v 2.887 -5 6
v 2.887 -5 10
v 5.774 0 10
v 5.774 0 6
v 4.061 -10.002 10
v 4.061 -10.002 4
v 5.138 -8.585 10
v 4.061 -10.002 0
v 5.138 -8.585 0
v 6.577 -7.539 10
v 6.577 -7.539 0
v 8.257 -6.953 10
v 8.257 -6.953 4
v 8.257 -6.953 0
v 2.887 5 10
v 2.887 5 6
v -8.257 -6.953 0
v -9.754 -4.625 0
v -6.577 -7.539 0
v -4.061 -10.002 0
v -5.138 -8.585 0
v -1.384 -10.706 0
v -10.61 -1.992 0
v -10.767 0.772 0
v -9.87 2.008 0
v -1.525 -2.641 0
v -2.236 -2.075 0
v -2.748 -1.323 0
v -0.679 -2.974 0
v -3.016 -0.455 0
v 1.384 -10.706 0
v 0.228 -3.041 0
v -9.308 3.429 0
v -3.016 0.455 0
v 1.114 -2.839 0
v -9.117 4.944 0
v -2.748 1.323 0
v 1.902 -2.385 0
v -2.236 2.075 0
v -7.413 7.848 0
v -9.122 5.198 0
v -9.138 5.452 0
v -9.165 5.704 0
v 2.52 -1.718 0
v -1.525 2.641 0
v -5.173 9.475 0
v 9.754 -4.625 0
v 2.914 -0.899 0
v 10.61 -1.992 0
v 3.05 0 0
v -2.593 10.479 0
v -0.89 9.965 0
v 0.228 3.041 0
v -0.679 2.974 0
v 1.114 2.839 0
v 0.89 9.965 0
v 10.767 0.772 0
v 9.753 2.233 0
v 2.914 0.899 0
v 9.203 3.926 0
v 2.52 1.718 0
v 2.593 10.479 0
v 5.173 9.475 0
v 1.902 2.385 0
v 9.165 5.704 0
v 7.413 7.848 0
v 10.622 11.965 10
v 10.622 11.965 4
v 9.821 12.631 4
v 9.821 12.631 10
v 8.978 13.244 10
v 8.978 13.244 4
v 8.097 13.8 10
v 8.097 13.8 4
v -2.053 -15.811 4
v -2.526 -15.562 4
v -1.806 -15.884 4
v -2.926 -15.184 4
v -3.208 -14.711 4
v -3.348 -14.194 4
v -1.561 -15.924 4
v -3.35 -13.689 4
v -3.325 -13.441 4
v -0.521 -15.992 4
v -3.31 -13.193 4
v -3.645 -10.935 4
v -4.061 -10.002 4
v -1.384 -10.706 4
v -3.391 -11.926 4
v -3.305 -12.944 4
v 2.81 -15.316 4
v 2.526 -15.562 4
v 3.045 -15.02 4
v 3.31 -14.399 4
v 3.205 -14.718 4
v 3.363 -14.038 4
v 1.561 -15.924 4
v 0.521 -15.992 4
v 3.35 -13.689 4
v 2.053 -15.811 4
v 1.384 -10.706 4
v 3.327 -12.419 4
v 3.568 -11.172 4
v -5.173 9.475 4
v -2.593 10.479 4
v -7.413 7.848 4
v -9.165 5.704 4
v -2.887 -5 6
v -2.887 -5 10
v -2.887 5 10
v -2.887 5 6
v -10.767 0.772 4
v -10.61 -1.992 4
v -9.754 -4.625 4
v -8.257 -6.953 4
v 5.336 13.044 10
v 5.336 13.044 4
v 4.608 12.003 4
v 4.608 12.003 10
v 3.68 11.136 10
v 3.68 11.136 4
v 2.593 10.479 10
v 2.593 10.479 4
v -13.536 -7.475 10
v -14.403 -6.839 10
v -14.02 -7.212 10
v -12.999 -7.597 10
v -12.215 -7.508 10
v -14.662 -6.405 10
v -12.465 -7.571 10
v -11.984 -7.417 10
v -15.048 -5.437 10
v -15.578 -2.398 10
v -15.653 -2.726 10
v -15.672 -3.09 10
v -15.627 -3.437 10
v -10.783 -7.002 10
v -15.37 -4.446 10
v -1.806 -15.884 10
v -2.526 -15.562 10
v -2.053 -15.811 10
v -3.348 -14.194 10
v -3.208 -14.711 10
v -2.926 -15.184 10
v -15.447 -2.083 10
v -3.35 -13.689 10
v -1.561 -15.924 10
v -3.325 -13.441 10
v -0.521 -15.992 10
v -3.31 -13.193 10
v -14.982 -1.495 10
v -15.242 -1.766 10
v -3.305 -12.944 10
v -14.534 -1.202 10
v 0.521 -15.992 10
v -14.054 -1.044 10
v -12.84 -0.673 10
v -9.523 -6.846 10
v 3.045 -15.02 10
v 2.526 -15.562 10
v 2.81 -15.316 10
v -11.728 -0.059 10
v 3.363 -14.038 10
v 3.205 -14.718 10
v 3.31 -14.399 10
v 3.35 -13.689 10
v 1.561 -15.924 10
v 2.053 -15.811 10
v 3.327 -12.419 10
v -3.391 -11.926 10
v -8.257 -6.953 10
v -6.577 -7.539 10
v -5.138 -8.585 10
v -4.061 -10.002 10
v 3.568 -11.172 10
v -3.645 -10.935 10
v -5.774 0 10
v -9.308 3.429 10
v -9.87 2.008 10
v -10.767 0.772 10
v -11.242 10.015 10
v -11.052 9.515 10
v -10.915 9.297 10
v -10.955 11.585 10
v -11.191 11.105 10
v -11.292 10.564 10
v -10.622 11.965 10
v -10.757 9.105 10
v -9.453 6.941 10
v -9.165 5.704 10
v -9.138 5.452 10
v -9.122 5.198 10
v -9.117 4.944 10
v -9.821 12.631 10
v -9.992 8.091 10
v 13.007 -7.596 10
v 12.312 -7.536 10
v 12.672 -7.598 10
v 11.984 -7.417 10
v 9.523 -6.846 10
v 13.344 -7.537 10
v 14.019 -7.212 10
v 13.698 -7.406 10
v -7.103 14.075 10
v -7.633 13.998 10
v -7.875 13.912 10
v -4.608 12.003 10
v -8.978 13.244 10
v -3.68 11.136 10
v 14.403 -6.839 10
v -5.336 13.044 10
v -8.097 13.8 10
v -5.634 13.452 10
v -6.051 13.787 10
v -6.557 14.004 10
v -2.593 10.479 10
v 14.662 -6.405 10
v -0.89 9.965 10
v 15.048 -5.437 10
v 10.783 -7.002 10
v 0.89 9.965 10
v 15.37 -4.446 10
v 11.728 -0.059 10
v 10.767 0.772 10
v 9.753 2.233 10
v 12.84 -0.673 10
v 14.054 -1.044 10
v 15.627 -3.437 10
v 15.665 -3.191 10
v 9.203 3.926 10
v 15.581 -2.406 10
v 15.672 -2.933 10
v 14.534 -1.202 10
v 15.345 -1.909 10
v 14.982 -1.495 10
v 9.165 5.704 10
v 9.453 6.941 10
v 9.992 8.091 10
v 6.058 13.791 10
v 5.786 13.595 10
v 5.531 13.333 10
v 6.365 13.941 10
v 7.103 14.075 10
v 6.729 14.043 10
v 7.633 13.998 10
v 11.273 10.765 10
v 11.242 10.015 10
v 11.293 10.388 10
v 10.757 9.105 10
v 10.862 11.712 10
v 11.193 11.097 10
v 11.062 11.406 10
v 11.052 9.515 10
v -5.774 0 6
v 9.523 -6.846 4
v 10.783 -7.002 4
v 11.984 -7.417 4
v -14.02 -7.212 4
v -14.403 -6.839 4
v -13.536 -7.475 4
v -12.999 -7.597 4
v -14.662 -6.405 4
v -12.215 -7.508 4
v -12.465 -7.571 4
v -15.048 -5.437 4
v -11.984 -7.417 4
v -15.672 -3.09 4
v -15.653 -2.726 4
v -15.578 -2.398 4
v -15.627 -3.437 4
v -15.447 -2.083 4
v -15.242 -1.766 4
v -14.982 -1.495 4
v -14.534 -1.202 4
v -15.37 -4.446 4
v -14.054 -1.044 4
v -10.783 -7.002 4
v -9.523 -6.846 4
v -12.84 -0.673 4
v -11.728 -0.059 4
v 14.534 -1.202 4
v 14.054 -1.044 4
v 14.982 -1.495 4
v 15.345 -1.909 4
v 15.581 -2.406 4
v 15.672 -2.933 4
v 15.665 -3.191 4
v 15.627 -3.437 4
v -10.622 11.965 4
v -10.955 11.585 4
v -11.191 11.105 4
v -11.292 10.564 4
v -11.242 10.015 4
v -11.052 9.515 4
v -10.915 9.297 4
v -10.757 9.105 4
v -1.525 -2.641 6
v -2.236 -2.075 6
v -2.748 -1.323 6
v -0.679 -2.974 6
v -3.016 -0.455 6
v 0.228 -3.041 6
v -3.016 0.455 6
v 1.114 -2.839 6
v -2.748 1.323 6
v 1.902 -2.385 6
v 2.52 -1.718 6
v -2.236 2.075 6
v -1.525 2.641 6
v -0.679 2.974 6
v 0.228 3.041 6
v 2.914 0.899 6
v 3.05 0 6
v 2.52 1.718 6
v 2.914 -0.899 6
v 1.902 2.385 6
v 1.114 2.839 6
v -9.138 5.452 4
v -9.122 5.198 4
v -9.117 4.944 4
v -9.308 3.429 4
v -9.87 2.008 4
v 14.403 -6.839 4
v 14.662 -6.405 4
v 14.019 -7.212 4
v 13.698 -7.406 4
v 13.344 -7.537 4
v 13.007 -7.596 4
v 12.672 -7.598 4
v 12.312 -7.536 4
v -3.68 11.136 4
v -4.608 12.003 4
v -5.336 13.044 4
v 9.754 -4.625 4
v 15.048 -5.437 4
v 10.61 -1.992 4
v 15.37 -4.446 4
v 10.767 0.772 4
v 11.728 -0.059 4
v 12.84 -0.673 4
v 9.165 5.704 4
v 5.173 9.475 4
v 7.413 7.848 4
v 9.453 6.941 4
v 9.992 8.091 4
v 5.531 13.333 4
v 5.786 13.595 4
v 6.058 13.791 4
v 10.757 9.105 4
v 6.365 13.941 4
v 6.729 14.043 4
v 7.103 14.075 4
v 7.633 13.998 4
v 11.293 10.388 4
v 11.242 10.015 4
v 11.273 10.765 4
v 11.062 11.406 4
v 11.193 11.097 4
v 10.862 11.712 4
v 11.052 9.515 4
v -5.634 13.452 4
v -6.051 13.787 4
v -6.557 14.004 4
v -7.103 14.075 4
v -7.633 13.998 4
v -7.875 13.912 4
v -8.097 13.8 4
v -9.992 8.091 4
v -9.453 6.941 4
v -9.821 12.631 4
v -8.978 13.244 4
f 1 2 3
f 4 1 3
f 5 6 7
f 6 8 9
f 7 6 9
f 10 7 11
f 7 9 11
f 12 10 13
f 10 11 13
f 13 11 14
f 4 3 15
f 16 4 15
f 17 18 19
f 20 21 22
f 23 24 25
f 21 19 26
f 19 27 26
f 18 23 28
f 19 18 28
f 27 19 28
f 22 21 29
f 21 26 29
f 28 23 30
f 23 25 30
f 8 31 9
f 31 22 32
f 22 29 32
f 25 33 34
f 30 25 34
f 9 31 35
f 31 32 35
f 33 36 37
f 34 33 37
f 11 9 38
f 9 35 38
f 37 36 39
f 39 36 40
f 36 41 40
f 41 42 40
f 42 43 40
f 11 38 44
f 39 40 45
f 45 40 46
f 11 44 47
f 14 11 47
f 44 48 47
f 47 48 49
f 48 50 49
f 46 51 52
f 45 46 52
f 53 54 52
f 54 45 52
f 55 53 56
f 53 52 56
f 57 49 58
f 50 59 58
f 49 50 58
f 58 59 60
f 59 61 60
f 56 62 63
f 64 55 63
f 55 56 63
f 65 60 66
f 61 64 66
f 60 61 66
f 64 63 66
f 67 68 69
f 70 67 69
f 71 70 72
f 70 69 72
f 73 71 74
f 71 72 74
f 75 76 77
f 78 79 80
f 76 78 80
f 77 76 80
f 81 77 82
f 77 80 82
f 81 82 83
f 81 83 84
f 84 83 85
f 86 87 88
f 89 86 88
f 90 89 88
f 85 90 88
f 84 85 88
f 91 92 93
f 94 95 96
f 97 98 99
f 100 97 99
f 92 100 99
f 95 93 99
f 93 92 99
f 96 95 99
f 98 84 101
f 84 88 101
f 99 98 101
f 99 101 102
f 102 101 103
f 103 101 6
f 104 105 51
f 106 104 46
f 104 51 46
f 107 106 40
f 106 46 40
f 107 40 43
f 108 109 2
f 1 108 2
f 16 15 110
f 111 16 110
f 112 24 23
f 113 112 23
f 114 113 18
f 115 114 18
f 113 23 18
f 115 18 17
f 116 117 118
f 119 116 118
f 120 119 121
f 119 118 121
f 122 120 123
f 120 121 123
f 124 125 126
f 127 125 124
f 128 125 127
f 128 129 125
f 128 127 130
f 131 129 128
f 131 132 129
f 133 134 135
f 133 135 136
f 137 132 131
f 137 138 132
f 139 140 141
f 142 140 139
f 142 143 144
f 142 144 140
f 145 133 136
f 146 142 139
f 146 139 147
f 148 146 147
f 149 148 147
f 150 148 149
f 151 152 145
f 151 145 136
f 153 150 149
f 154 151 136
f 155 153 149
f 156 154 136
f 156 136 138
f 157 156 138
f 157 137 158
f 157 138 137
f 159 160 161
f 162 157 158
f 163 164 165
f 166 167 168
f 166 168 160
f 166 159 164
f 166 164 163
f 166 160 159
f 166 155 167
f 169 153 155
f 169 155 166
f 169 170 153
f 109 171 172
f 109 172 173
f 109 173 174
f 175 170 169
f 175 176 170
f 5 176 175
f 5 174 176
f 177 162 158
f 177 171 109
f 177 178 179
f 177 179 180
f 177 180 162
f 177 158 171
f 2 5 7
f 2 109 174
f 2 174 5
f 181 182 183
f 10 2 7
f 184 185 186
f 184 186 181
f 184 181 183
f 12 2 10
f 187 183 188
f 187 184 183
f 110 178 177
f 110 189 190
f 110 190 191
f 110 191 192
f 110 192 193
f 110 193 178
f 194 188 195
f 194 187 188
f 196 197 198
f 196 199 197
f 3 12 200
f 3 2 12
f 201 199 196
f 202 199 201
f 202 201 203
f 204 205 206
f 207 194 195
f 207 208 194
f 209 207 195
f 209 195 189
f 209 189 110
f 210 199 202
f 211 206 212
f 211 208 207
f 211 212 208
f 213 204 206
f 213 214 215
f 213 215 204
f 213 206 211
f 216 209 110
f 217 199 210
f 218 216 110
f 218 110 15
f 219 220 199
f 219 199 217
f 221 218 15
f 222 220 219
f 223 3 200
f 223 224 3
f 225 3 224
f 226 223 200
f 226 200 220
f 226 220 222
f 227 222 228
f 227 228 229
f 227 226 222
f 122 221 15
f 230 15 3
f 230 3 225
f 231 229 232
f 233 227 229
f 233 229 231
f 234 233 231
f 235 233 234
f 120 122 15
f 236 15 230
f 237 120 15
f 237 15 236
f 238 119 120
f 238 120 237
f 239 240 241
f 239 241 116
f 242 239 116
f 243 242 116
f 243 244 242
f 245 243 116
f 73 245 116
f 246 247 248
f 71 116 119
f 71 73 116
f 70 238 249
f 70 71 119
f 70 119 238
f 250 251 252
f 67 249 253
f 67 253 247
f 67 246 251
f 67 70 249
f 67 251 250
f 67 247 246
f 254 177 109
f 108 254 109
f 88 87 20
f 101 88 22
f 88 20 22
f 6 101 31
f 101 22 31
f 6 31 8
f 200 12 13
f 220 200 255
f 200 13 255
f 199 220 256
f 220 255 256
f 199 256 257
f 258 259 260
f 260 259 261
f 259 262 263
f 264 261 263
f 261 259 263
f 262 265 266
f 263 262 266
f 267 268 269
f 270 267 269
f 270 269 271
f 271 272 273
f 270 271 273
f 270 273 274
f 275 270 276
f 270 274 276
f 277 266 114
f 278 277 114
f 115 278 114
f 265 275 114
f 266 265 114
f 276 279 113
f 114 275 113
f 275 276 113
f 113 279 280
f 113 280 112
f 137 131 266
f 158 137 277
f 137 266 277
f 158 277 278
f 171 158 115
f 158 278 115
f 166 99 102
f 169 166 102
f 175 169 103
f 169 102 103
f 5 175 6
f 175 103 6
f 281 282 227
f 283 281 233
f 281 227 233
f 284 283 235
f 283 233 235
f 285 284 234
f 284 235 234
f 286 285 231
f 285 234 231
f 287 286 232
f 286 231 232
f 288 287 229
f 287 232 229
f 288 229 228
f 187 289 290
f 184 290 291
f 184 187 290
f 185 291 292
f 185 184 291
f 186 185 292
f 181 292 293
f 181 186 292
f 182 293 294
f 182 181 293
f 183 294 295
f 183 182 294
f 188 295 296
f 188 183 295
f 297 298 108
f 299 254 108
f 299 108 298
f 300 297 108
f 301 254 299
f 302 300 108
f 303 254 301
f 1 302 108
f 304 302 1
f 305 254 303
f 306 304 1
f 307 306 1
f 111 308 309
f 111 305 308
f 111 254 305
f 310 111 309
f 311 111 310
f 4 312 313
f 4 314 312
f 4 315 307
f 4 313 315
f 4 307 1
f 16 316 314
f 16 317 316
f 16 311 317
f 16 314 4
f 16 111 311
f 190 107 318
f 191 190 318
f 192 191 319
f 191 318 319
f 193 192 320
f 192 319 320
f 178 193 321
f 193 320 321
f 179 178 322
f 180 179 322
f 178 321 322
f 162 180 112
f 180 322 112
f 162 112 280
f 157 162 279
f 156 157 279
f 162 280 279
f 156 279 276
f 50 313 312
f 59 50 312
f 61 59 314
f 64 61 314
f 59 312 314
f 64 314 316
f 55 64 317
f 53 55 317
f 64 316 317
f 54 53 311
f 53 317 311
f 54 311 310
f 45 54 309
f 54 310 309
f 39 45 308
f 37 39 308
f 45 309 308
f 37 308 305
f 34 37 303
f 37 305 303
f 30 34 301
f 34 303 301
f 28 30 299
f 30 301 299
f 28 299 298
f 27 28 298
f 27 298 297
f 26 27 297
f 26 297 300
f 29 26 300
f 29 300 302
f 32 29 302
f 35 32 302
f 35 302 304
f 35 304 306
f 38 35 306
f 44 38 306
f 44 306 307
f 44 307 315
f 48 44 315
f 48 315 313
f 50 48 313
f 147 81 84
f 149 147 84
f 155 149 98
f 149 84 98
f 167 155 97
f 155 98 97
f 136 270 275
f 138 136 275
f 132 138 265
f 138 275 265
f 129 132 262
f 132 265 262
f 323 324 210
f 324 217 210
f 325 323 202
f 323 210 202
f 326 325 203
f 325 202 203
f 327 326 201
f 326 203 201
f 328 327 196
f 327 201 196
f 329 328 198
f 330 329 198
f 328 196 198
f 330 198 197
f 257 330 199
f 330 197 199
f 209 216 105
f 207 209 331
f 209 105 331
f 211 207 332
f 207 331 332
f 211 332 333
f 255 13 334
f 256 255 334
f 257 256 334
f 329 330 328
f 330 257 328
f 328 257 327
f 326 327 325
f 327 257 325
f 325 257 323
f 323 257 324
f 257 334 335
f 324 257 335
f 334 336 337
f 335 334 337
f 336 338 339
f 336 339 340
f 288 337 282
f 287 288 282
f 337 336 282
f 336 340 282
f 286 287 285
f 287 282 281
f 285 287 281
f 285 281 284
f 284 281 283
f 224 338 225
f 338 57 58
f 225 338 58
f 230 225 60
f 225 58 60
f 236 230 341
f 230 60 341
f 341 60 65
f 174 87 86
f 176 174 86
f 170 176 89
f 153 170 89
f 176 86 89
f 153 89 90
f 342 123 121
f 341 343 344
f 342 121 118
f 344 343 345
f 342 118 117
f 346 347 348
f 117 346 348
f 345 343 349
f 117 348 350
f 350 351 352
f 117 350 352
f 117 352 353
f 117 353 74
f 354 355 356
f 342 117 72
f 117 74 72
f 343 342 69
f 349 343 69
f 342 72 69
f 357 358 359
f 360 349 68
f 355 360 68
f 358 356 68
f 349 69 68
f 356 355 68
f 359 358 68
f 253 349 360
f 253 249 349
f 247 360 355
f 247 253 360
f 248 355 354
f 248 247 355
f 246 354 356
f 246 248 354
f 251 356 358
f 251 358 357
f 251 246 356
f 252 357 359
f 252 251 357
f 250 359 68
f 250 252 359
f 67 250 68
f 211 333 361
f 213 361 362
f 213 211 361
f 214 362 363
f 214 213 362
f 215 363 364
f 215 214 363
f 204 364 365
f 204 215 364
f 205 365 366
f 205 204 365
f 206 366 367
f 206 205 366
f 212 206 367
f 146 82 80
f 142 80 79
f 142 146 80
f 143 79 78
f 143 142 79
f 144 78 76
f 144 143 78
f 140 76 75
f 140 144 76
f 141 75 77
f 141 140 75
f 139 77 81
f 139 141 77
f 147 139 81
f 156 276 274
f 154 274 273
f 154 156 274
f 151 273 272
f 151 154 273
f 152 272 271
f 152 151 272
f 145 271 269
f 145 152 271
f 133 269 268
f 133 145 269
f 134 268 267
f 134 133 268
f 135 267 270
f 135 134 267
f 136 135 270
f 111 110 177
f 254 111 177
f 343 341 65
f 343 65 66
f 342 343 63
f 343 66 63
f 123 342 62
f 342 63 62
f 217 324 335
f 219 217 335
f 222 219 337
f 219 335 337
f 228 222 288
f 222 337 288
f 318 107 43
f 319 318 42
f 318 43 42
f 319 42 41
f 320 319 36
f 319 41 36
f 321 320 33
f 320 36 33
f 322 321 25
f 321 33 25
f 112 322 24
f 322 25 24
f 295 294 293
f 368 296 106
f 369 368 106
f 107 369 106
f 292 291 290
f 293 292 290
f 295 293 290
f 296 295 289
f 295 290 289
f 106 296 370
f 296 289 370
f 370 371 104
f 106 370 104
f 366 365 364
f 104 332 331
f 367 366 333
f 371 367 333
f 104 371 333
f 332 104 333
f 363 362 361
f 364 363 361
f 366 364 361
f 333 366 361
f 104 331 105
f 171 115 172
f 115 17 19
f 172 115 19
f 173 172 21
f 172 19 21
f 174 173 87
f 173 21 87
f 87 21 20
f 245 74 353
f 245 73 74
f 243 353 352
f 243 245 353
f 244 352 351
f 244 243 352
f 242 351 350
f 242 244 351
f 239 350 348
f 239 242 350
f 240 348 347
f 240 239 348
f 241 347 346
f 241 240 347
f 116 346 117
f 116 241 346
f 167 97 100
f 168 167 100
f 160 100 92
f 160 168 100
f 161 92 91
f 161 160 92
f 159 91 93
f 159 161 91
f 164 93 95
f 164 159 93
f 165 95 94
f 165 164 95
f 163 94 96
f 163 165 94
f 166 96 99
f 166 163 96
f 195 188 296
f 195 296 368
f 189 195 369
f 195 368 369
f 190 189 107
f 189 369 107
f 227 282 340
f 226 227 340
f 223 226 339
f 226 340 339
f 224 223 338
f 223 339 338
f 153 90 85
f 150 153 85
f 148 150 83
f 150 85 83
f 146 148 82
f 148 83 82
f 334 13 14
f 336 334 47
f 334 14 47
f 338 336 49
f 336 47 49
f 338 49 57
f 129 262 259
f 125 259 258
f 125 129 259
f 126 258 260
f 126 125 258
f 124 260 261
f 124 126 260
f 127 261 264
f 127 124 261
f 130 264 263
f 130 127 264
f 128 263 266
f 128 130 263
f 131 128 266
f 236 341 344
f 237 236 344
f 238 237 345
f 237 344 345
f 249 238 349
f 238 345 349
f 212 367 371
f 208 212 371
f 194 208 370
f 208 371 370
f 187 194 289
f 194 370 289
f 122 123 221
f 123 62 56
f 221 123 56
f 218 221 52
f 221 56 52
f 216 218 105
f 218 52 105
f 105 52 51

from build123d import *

# Parameters (mm, degrees)
F0_R     = 10.795
F1_DEPTH = 4
F3_DEPTH = 6
F4_R     = 2
F5_R     = 3.05
F6_DEPTH = 25
F8_DEPTH = 4
F9_DEPTH = 25


with BuildPart() as f1:
    # F0 (on Top) → F1 (new body)
    with BuildSketch(Plane.XY):
        Circle(F0_R)
    extrude(amount=F1_DEPTH)

    # F2 (on face) → F3 (join)
    with BuildSketch(Plane.XY.offset(4)):
        with BuildLine():
            ThreePointArc((10.7673628762, 0.7719596449), (9.4157239289, 3.0593541588), (9.164726046, 5.704368633))
            ThreePointArc((9.164726046, 5.704368633), (6.3451417985, 8.7333384543), (2.5931208628, 10.4789192759))
            ThreePointArc((2.5931208628, 10.4789192759), (0, 9.9002780251), (-2.5931208628, 10.4789192759))
            ThreePointArc((-2.5931208628, 10.4789192759), (-6.3451417985, 8.7333384543), (-9.164726046, 5.704368633))
            ThreePointArc((-9.164726046, 5.704368633), (-9.129079829, 5.3250630068), (-9.1171822858, 4.94427191))
            ThreePointArc((-9.1171822858, 4.94427191), (-9.5447100851, 2.7008768479), (-10.7673628762, 0.7719596449))
            ThreePointArc((-10.7673628762, 0.7719596449), (-10.2666550934, -3.3358384543), (-8.2572330568, -6.9534255763))
            ThreePointArc((-8.2572330568, -6.9534255763), (-5.8192374168, -8.0094931714), (-4.0614753639, -10.0018219774))
            ThreePointArc((-4.0614753639, -10.0018219774), (0, -10.795), (4.0614753639, -10.0018219774))
            ThreePointArc((4.0614753639, -10.0018219774), (5.8192374168, -8.0094931714), (8.2572330568, -6.9534255763))
            ThreePointArc((8.2572330568, -6.9534255763), (10.1407311336, -3.7010264895), (10.795, 0))
            ThreePointArc((10.795, 0), (10.7880885065, 0.3862271041), (10.7673628762, 0.7719596449))
        make_face()
        with BuildLine():
            ThreePointArc((9.164726046, 5.704368633), (10.1650587649, 8.3626728896), (12.2607475986, 10.2797893132))
            ThreePointArc((12.2607475986, 10.2797893132), (9.4045640367, 12.94427191), (5.9878812408, 14.8372934947))
            ThreePointArc((5.9878812408, 14.8372934947), (4.8121986381, 12.2517534182), (2.5931208628, 10.4789192759))
            ThreePointArc((2.5931208628, 10.4789192759), (6.3451417985, 8.7333384543), (9.164726046, 5.704368633))
        make_face()
        with BuildLine():
            ThreePointArc((-2.5931208628, 10.4789192759), (-4.8121986381, 12.2517534182), (-5.9878812408, 14.8372934947))
            ThreePointArc((-5.9878812408, 14.8372934947), (-9.4045640367, 12.94427191), (-12.2607475986, 10.2797893132))
            ThreePointArc((-12.2607475986, 10.2797893132), (-10.1650587649, 8.3626728896), (-9.164726046, 5.704368633))
            ThreePointArc((-9.164726046, 5.704368633), (-6.3451417985, 8.7333384543), (-2.5931208628, 10.4789192759))
        make_face()
        with BuildLine():
            ThreePointArc((-10.7673628762, 0.7719596449), (-13.1391610839, -0.7906728554), (-15.961461726, -1.1098376324))
            ThreePointArc((-15.961461726, -1.1098376324), (-15.2169042607, -4.94427191), (-13.5654399842, -8.4840343019))
            ThreePointArc((-13.5654399842, -8.4840343019), (-11.0945504525, -7.0833373356), (-8.2572330568, -6.9534255763))
            ThreePointArc((-8.2572330568, -6.9534255763), (-10.2666550934, -3.3358384543), (-10.7673628762, 0.7719596449))
        make_face()
        with BuildLine():
            ThreePointArc((-3.876844616, -15.5232108735), (0, -16), (3.876844616, -15.5232108735))
            ThreePointArc((3.876844616, -15.5232108735), (3.3082494954, -12.7404161168), (4.0614753639, -10.0018219774))
            ThreePointArc((4.0614753639, -10.0018219774), (0, -10.795), (-4.0614753639, -10.0018219774))
            ThreePointArc((-4.0614753639, -10.0018219774), (-3.4970280206, -11.4251845557), (-3.3048420618, -12.94427191))
            ThreePointArc((-3.3048420618, -12.94427191), (-3.4495594274, -14.2650778287), (-3.876844616, -15.5232108735))
        make_face()
        with BuildLine():
            ThreePointArc((13.5654399842, -8.4840343019), (15.2169042607, -4.94427191), (15.961461726, -1.1098376324))
            ThreePointArc((15.961461726, -1.1098376324), (13.1391610839, -0.7906728554), (10.7673628762, 0.7719596449))
            ThreePointArc((10.7673628762, 0.7719596449), (10.7880885065, 0.3862271041), (10.795, 0))
            ThreePointArc((10.795, 0), (10.1407311336, -3.7010264895), (8.2572330568, -6.9534255763))
            ThreePointArc((8.2572330568, -6.9534255763), (11.0945504525, -7.0833373356), (13.5654399842, -8.4840343019))
        make_face()
    extrude(amount=F3_DEPTH)

    # F4
    f4_edges = [f1.edges().sort_by_distance(p)[0] for p in [
        (-5.987881, 14.837293, 7),
        (-12.260748, 10.279789, 7),
        (-15.961462, -1.109838, 7),
        (-13.56544, -8.484034, 7),
        (-3.876845, -15.523211, 7),
        (3.876845, -15.523211, 7),
        (13.56544, -8.484034, 7),
        (15.961462, -1.109838, 7),
        (12.260748, 10.279789, 7),
        (5.987881, 14.837293, 7),
    ]]
    fillet(f4_edges, radius=F4_R)

    # F5 (on face) → F6 (cut)
    with BuildSketch(Plane.XY.offset(10)):
        Circle(F5_R)
    extrude(amount=-F6_DEPTH, mode=Mode.SUBTRACT)

    # F7 (on face) → F8 (cut)
    with BuildSketch(Plane.XY.offset(10)):
        Polygon((2.8867513459, -5), (5.7735026919, 0), (2.8867513459, 5), (-2.8867513459, 5), (-5.7735026919, 0), (-2.8867513459, -5), align=None)
    extrude(amount=-F8_DEPTH, mode=Mode.SUBTRACT)

    # F2 (on face) → F9 (cut)
    with BuildSketch(Plane.XY.offset(4)):
        with BuildLine():
            ThreePointArc((-9.1171822858, 4.94427191), (-9.129079829, 5.3250630068), (-9.164726046, 5.704368633))
            ThreePointArc((-9.164726046, 5.704368633), (-10.2666550934, 3.3358384543), (-10.7673628762, 0.7719596449))
            ThreePointArc((-10.7673628762, 0.7719596449), (-9.5447100851, 2.7008768479), (-9.1171822858, 4.94427191))
        make_face()
        with BuildLine():
            ThreePointArc((-2.5931208628, 10.4789192759), (0, 9.9002780251), (2.5931208628, 10.4789192759))
            ThreePointArc((2.5931208628, 10.4789192759), (0, 10.795), (-2.5931208628, 10.4789192759))
        make_face()
        with BuildLine():
            ThreePointArc((10.7673628762, 0.7719596449), (10.2666550934, 3.3358384543), (9.164726046, 5.704368633))
            ThreePointArc((9.164726046, 5.704368633), (9.4157239289, 3.0593541588), (10.7673628762, 0.7719596449))
        make_face()
        with BuildLine():
            ThreePointArc((4.0614753639, -10.0018219774), (6.3451417985, -8.7333384543), (8.2572330568, -6.9534255763))
            ThreePointArc((8.2572330568, -6.9534255763), (5.8192374168, -8.0094931714), (4.0614753639, -10.0018219774))
        make_face()
        with BuildLine():
            ThreePointArc((-8.2572330568, -6.9534255763), (-6.3451417985, -8.7333384543), (-4.0614753639, -10.0018219774))
            ThreePointArc((-4.0614753639, -10.0018219774), (-5.8192374168, -8.0094931714), (-8.2572330568, -6.9534255763))
        make_face()
    extrude(amount=-F9_DEPTH, mode=Mode.SUBTRACT)


solid = f1.part
